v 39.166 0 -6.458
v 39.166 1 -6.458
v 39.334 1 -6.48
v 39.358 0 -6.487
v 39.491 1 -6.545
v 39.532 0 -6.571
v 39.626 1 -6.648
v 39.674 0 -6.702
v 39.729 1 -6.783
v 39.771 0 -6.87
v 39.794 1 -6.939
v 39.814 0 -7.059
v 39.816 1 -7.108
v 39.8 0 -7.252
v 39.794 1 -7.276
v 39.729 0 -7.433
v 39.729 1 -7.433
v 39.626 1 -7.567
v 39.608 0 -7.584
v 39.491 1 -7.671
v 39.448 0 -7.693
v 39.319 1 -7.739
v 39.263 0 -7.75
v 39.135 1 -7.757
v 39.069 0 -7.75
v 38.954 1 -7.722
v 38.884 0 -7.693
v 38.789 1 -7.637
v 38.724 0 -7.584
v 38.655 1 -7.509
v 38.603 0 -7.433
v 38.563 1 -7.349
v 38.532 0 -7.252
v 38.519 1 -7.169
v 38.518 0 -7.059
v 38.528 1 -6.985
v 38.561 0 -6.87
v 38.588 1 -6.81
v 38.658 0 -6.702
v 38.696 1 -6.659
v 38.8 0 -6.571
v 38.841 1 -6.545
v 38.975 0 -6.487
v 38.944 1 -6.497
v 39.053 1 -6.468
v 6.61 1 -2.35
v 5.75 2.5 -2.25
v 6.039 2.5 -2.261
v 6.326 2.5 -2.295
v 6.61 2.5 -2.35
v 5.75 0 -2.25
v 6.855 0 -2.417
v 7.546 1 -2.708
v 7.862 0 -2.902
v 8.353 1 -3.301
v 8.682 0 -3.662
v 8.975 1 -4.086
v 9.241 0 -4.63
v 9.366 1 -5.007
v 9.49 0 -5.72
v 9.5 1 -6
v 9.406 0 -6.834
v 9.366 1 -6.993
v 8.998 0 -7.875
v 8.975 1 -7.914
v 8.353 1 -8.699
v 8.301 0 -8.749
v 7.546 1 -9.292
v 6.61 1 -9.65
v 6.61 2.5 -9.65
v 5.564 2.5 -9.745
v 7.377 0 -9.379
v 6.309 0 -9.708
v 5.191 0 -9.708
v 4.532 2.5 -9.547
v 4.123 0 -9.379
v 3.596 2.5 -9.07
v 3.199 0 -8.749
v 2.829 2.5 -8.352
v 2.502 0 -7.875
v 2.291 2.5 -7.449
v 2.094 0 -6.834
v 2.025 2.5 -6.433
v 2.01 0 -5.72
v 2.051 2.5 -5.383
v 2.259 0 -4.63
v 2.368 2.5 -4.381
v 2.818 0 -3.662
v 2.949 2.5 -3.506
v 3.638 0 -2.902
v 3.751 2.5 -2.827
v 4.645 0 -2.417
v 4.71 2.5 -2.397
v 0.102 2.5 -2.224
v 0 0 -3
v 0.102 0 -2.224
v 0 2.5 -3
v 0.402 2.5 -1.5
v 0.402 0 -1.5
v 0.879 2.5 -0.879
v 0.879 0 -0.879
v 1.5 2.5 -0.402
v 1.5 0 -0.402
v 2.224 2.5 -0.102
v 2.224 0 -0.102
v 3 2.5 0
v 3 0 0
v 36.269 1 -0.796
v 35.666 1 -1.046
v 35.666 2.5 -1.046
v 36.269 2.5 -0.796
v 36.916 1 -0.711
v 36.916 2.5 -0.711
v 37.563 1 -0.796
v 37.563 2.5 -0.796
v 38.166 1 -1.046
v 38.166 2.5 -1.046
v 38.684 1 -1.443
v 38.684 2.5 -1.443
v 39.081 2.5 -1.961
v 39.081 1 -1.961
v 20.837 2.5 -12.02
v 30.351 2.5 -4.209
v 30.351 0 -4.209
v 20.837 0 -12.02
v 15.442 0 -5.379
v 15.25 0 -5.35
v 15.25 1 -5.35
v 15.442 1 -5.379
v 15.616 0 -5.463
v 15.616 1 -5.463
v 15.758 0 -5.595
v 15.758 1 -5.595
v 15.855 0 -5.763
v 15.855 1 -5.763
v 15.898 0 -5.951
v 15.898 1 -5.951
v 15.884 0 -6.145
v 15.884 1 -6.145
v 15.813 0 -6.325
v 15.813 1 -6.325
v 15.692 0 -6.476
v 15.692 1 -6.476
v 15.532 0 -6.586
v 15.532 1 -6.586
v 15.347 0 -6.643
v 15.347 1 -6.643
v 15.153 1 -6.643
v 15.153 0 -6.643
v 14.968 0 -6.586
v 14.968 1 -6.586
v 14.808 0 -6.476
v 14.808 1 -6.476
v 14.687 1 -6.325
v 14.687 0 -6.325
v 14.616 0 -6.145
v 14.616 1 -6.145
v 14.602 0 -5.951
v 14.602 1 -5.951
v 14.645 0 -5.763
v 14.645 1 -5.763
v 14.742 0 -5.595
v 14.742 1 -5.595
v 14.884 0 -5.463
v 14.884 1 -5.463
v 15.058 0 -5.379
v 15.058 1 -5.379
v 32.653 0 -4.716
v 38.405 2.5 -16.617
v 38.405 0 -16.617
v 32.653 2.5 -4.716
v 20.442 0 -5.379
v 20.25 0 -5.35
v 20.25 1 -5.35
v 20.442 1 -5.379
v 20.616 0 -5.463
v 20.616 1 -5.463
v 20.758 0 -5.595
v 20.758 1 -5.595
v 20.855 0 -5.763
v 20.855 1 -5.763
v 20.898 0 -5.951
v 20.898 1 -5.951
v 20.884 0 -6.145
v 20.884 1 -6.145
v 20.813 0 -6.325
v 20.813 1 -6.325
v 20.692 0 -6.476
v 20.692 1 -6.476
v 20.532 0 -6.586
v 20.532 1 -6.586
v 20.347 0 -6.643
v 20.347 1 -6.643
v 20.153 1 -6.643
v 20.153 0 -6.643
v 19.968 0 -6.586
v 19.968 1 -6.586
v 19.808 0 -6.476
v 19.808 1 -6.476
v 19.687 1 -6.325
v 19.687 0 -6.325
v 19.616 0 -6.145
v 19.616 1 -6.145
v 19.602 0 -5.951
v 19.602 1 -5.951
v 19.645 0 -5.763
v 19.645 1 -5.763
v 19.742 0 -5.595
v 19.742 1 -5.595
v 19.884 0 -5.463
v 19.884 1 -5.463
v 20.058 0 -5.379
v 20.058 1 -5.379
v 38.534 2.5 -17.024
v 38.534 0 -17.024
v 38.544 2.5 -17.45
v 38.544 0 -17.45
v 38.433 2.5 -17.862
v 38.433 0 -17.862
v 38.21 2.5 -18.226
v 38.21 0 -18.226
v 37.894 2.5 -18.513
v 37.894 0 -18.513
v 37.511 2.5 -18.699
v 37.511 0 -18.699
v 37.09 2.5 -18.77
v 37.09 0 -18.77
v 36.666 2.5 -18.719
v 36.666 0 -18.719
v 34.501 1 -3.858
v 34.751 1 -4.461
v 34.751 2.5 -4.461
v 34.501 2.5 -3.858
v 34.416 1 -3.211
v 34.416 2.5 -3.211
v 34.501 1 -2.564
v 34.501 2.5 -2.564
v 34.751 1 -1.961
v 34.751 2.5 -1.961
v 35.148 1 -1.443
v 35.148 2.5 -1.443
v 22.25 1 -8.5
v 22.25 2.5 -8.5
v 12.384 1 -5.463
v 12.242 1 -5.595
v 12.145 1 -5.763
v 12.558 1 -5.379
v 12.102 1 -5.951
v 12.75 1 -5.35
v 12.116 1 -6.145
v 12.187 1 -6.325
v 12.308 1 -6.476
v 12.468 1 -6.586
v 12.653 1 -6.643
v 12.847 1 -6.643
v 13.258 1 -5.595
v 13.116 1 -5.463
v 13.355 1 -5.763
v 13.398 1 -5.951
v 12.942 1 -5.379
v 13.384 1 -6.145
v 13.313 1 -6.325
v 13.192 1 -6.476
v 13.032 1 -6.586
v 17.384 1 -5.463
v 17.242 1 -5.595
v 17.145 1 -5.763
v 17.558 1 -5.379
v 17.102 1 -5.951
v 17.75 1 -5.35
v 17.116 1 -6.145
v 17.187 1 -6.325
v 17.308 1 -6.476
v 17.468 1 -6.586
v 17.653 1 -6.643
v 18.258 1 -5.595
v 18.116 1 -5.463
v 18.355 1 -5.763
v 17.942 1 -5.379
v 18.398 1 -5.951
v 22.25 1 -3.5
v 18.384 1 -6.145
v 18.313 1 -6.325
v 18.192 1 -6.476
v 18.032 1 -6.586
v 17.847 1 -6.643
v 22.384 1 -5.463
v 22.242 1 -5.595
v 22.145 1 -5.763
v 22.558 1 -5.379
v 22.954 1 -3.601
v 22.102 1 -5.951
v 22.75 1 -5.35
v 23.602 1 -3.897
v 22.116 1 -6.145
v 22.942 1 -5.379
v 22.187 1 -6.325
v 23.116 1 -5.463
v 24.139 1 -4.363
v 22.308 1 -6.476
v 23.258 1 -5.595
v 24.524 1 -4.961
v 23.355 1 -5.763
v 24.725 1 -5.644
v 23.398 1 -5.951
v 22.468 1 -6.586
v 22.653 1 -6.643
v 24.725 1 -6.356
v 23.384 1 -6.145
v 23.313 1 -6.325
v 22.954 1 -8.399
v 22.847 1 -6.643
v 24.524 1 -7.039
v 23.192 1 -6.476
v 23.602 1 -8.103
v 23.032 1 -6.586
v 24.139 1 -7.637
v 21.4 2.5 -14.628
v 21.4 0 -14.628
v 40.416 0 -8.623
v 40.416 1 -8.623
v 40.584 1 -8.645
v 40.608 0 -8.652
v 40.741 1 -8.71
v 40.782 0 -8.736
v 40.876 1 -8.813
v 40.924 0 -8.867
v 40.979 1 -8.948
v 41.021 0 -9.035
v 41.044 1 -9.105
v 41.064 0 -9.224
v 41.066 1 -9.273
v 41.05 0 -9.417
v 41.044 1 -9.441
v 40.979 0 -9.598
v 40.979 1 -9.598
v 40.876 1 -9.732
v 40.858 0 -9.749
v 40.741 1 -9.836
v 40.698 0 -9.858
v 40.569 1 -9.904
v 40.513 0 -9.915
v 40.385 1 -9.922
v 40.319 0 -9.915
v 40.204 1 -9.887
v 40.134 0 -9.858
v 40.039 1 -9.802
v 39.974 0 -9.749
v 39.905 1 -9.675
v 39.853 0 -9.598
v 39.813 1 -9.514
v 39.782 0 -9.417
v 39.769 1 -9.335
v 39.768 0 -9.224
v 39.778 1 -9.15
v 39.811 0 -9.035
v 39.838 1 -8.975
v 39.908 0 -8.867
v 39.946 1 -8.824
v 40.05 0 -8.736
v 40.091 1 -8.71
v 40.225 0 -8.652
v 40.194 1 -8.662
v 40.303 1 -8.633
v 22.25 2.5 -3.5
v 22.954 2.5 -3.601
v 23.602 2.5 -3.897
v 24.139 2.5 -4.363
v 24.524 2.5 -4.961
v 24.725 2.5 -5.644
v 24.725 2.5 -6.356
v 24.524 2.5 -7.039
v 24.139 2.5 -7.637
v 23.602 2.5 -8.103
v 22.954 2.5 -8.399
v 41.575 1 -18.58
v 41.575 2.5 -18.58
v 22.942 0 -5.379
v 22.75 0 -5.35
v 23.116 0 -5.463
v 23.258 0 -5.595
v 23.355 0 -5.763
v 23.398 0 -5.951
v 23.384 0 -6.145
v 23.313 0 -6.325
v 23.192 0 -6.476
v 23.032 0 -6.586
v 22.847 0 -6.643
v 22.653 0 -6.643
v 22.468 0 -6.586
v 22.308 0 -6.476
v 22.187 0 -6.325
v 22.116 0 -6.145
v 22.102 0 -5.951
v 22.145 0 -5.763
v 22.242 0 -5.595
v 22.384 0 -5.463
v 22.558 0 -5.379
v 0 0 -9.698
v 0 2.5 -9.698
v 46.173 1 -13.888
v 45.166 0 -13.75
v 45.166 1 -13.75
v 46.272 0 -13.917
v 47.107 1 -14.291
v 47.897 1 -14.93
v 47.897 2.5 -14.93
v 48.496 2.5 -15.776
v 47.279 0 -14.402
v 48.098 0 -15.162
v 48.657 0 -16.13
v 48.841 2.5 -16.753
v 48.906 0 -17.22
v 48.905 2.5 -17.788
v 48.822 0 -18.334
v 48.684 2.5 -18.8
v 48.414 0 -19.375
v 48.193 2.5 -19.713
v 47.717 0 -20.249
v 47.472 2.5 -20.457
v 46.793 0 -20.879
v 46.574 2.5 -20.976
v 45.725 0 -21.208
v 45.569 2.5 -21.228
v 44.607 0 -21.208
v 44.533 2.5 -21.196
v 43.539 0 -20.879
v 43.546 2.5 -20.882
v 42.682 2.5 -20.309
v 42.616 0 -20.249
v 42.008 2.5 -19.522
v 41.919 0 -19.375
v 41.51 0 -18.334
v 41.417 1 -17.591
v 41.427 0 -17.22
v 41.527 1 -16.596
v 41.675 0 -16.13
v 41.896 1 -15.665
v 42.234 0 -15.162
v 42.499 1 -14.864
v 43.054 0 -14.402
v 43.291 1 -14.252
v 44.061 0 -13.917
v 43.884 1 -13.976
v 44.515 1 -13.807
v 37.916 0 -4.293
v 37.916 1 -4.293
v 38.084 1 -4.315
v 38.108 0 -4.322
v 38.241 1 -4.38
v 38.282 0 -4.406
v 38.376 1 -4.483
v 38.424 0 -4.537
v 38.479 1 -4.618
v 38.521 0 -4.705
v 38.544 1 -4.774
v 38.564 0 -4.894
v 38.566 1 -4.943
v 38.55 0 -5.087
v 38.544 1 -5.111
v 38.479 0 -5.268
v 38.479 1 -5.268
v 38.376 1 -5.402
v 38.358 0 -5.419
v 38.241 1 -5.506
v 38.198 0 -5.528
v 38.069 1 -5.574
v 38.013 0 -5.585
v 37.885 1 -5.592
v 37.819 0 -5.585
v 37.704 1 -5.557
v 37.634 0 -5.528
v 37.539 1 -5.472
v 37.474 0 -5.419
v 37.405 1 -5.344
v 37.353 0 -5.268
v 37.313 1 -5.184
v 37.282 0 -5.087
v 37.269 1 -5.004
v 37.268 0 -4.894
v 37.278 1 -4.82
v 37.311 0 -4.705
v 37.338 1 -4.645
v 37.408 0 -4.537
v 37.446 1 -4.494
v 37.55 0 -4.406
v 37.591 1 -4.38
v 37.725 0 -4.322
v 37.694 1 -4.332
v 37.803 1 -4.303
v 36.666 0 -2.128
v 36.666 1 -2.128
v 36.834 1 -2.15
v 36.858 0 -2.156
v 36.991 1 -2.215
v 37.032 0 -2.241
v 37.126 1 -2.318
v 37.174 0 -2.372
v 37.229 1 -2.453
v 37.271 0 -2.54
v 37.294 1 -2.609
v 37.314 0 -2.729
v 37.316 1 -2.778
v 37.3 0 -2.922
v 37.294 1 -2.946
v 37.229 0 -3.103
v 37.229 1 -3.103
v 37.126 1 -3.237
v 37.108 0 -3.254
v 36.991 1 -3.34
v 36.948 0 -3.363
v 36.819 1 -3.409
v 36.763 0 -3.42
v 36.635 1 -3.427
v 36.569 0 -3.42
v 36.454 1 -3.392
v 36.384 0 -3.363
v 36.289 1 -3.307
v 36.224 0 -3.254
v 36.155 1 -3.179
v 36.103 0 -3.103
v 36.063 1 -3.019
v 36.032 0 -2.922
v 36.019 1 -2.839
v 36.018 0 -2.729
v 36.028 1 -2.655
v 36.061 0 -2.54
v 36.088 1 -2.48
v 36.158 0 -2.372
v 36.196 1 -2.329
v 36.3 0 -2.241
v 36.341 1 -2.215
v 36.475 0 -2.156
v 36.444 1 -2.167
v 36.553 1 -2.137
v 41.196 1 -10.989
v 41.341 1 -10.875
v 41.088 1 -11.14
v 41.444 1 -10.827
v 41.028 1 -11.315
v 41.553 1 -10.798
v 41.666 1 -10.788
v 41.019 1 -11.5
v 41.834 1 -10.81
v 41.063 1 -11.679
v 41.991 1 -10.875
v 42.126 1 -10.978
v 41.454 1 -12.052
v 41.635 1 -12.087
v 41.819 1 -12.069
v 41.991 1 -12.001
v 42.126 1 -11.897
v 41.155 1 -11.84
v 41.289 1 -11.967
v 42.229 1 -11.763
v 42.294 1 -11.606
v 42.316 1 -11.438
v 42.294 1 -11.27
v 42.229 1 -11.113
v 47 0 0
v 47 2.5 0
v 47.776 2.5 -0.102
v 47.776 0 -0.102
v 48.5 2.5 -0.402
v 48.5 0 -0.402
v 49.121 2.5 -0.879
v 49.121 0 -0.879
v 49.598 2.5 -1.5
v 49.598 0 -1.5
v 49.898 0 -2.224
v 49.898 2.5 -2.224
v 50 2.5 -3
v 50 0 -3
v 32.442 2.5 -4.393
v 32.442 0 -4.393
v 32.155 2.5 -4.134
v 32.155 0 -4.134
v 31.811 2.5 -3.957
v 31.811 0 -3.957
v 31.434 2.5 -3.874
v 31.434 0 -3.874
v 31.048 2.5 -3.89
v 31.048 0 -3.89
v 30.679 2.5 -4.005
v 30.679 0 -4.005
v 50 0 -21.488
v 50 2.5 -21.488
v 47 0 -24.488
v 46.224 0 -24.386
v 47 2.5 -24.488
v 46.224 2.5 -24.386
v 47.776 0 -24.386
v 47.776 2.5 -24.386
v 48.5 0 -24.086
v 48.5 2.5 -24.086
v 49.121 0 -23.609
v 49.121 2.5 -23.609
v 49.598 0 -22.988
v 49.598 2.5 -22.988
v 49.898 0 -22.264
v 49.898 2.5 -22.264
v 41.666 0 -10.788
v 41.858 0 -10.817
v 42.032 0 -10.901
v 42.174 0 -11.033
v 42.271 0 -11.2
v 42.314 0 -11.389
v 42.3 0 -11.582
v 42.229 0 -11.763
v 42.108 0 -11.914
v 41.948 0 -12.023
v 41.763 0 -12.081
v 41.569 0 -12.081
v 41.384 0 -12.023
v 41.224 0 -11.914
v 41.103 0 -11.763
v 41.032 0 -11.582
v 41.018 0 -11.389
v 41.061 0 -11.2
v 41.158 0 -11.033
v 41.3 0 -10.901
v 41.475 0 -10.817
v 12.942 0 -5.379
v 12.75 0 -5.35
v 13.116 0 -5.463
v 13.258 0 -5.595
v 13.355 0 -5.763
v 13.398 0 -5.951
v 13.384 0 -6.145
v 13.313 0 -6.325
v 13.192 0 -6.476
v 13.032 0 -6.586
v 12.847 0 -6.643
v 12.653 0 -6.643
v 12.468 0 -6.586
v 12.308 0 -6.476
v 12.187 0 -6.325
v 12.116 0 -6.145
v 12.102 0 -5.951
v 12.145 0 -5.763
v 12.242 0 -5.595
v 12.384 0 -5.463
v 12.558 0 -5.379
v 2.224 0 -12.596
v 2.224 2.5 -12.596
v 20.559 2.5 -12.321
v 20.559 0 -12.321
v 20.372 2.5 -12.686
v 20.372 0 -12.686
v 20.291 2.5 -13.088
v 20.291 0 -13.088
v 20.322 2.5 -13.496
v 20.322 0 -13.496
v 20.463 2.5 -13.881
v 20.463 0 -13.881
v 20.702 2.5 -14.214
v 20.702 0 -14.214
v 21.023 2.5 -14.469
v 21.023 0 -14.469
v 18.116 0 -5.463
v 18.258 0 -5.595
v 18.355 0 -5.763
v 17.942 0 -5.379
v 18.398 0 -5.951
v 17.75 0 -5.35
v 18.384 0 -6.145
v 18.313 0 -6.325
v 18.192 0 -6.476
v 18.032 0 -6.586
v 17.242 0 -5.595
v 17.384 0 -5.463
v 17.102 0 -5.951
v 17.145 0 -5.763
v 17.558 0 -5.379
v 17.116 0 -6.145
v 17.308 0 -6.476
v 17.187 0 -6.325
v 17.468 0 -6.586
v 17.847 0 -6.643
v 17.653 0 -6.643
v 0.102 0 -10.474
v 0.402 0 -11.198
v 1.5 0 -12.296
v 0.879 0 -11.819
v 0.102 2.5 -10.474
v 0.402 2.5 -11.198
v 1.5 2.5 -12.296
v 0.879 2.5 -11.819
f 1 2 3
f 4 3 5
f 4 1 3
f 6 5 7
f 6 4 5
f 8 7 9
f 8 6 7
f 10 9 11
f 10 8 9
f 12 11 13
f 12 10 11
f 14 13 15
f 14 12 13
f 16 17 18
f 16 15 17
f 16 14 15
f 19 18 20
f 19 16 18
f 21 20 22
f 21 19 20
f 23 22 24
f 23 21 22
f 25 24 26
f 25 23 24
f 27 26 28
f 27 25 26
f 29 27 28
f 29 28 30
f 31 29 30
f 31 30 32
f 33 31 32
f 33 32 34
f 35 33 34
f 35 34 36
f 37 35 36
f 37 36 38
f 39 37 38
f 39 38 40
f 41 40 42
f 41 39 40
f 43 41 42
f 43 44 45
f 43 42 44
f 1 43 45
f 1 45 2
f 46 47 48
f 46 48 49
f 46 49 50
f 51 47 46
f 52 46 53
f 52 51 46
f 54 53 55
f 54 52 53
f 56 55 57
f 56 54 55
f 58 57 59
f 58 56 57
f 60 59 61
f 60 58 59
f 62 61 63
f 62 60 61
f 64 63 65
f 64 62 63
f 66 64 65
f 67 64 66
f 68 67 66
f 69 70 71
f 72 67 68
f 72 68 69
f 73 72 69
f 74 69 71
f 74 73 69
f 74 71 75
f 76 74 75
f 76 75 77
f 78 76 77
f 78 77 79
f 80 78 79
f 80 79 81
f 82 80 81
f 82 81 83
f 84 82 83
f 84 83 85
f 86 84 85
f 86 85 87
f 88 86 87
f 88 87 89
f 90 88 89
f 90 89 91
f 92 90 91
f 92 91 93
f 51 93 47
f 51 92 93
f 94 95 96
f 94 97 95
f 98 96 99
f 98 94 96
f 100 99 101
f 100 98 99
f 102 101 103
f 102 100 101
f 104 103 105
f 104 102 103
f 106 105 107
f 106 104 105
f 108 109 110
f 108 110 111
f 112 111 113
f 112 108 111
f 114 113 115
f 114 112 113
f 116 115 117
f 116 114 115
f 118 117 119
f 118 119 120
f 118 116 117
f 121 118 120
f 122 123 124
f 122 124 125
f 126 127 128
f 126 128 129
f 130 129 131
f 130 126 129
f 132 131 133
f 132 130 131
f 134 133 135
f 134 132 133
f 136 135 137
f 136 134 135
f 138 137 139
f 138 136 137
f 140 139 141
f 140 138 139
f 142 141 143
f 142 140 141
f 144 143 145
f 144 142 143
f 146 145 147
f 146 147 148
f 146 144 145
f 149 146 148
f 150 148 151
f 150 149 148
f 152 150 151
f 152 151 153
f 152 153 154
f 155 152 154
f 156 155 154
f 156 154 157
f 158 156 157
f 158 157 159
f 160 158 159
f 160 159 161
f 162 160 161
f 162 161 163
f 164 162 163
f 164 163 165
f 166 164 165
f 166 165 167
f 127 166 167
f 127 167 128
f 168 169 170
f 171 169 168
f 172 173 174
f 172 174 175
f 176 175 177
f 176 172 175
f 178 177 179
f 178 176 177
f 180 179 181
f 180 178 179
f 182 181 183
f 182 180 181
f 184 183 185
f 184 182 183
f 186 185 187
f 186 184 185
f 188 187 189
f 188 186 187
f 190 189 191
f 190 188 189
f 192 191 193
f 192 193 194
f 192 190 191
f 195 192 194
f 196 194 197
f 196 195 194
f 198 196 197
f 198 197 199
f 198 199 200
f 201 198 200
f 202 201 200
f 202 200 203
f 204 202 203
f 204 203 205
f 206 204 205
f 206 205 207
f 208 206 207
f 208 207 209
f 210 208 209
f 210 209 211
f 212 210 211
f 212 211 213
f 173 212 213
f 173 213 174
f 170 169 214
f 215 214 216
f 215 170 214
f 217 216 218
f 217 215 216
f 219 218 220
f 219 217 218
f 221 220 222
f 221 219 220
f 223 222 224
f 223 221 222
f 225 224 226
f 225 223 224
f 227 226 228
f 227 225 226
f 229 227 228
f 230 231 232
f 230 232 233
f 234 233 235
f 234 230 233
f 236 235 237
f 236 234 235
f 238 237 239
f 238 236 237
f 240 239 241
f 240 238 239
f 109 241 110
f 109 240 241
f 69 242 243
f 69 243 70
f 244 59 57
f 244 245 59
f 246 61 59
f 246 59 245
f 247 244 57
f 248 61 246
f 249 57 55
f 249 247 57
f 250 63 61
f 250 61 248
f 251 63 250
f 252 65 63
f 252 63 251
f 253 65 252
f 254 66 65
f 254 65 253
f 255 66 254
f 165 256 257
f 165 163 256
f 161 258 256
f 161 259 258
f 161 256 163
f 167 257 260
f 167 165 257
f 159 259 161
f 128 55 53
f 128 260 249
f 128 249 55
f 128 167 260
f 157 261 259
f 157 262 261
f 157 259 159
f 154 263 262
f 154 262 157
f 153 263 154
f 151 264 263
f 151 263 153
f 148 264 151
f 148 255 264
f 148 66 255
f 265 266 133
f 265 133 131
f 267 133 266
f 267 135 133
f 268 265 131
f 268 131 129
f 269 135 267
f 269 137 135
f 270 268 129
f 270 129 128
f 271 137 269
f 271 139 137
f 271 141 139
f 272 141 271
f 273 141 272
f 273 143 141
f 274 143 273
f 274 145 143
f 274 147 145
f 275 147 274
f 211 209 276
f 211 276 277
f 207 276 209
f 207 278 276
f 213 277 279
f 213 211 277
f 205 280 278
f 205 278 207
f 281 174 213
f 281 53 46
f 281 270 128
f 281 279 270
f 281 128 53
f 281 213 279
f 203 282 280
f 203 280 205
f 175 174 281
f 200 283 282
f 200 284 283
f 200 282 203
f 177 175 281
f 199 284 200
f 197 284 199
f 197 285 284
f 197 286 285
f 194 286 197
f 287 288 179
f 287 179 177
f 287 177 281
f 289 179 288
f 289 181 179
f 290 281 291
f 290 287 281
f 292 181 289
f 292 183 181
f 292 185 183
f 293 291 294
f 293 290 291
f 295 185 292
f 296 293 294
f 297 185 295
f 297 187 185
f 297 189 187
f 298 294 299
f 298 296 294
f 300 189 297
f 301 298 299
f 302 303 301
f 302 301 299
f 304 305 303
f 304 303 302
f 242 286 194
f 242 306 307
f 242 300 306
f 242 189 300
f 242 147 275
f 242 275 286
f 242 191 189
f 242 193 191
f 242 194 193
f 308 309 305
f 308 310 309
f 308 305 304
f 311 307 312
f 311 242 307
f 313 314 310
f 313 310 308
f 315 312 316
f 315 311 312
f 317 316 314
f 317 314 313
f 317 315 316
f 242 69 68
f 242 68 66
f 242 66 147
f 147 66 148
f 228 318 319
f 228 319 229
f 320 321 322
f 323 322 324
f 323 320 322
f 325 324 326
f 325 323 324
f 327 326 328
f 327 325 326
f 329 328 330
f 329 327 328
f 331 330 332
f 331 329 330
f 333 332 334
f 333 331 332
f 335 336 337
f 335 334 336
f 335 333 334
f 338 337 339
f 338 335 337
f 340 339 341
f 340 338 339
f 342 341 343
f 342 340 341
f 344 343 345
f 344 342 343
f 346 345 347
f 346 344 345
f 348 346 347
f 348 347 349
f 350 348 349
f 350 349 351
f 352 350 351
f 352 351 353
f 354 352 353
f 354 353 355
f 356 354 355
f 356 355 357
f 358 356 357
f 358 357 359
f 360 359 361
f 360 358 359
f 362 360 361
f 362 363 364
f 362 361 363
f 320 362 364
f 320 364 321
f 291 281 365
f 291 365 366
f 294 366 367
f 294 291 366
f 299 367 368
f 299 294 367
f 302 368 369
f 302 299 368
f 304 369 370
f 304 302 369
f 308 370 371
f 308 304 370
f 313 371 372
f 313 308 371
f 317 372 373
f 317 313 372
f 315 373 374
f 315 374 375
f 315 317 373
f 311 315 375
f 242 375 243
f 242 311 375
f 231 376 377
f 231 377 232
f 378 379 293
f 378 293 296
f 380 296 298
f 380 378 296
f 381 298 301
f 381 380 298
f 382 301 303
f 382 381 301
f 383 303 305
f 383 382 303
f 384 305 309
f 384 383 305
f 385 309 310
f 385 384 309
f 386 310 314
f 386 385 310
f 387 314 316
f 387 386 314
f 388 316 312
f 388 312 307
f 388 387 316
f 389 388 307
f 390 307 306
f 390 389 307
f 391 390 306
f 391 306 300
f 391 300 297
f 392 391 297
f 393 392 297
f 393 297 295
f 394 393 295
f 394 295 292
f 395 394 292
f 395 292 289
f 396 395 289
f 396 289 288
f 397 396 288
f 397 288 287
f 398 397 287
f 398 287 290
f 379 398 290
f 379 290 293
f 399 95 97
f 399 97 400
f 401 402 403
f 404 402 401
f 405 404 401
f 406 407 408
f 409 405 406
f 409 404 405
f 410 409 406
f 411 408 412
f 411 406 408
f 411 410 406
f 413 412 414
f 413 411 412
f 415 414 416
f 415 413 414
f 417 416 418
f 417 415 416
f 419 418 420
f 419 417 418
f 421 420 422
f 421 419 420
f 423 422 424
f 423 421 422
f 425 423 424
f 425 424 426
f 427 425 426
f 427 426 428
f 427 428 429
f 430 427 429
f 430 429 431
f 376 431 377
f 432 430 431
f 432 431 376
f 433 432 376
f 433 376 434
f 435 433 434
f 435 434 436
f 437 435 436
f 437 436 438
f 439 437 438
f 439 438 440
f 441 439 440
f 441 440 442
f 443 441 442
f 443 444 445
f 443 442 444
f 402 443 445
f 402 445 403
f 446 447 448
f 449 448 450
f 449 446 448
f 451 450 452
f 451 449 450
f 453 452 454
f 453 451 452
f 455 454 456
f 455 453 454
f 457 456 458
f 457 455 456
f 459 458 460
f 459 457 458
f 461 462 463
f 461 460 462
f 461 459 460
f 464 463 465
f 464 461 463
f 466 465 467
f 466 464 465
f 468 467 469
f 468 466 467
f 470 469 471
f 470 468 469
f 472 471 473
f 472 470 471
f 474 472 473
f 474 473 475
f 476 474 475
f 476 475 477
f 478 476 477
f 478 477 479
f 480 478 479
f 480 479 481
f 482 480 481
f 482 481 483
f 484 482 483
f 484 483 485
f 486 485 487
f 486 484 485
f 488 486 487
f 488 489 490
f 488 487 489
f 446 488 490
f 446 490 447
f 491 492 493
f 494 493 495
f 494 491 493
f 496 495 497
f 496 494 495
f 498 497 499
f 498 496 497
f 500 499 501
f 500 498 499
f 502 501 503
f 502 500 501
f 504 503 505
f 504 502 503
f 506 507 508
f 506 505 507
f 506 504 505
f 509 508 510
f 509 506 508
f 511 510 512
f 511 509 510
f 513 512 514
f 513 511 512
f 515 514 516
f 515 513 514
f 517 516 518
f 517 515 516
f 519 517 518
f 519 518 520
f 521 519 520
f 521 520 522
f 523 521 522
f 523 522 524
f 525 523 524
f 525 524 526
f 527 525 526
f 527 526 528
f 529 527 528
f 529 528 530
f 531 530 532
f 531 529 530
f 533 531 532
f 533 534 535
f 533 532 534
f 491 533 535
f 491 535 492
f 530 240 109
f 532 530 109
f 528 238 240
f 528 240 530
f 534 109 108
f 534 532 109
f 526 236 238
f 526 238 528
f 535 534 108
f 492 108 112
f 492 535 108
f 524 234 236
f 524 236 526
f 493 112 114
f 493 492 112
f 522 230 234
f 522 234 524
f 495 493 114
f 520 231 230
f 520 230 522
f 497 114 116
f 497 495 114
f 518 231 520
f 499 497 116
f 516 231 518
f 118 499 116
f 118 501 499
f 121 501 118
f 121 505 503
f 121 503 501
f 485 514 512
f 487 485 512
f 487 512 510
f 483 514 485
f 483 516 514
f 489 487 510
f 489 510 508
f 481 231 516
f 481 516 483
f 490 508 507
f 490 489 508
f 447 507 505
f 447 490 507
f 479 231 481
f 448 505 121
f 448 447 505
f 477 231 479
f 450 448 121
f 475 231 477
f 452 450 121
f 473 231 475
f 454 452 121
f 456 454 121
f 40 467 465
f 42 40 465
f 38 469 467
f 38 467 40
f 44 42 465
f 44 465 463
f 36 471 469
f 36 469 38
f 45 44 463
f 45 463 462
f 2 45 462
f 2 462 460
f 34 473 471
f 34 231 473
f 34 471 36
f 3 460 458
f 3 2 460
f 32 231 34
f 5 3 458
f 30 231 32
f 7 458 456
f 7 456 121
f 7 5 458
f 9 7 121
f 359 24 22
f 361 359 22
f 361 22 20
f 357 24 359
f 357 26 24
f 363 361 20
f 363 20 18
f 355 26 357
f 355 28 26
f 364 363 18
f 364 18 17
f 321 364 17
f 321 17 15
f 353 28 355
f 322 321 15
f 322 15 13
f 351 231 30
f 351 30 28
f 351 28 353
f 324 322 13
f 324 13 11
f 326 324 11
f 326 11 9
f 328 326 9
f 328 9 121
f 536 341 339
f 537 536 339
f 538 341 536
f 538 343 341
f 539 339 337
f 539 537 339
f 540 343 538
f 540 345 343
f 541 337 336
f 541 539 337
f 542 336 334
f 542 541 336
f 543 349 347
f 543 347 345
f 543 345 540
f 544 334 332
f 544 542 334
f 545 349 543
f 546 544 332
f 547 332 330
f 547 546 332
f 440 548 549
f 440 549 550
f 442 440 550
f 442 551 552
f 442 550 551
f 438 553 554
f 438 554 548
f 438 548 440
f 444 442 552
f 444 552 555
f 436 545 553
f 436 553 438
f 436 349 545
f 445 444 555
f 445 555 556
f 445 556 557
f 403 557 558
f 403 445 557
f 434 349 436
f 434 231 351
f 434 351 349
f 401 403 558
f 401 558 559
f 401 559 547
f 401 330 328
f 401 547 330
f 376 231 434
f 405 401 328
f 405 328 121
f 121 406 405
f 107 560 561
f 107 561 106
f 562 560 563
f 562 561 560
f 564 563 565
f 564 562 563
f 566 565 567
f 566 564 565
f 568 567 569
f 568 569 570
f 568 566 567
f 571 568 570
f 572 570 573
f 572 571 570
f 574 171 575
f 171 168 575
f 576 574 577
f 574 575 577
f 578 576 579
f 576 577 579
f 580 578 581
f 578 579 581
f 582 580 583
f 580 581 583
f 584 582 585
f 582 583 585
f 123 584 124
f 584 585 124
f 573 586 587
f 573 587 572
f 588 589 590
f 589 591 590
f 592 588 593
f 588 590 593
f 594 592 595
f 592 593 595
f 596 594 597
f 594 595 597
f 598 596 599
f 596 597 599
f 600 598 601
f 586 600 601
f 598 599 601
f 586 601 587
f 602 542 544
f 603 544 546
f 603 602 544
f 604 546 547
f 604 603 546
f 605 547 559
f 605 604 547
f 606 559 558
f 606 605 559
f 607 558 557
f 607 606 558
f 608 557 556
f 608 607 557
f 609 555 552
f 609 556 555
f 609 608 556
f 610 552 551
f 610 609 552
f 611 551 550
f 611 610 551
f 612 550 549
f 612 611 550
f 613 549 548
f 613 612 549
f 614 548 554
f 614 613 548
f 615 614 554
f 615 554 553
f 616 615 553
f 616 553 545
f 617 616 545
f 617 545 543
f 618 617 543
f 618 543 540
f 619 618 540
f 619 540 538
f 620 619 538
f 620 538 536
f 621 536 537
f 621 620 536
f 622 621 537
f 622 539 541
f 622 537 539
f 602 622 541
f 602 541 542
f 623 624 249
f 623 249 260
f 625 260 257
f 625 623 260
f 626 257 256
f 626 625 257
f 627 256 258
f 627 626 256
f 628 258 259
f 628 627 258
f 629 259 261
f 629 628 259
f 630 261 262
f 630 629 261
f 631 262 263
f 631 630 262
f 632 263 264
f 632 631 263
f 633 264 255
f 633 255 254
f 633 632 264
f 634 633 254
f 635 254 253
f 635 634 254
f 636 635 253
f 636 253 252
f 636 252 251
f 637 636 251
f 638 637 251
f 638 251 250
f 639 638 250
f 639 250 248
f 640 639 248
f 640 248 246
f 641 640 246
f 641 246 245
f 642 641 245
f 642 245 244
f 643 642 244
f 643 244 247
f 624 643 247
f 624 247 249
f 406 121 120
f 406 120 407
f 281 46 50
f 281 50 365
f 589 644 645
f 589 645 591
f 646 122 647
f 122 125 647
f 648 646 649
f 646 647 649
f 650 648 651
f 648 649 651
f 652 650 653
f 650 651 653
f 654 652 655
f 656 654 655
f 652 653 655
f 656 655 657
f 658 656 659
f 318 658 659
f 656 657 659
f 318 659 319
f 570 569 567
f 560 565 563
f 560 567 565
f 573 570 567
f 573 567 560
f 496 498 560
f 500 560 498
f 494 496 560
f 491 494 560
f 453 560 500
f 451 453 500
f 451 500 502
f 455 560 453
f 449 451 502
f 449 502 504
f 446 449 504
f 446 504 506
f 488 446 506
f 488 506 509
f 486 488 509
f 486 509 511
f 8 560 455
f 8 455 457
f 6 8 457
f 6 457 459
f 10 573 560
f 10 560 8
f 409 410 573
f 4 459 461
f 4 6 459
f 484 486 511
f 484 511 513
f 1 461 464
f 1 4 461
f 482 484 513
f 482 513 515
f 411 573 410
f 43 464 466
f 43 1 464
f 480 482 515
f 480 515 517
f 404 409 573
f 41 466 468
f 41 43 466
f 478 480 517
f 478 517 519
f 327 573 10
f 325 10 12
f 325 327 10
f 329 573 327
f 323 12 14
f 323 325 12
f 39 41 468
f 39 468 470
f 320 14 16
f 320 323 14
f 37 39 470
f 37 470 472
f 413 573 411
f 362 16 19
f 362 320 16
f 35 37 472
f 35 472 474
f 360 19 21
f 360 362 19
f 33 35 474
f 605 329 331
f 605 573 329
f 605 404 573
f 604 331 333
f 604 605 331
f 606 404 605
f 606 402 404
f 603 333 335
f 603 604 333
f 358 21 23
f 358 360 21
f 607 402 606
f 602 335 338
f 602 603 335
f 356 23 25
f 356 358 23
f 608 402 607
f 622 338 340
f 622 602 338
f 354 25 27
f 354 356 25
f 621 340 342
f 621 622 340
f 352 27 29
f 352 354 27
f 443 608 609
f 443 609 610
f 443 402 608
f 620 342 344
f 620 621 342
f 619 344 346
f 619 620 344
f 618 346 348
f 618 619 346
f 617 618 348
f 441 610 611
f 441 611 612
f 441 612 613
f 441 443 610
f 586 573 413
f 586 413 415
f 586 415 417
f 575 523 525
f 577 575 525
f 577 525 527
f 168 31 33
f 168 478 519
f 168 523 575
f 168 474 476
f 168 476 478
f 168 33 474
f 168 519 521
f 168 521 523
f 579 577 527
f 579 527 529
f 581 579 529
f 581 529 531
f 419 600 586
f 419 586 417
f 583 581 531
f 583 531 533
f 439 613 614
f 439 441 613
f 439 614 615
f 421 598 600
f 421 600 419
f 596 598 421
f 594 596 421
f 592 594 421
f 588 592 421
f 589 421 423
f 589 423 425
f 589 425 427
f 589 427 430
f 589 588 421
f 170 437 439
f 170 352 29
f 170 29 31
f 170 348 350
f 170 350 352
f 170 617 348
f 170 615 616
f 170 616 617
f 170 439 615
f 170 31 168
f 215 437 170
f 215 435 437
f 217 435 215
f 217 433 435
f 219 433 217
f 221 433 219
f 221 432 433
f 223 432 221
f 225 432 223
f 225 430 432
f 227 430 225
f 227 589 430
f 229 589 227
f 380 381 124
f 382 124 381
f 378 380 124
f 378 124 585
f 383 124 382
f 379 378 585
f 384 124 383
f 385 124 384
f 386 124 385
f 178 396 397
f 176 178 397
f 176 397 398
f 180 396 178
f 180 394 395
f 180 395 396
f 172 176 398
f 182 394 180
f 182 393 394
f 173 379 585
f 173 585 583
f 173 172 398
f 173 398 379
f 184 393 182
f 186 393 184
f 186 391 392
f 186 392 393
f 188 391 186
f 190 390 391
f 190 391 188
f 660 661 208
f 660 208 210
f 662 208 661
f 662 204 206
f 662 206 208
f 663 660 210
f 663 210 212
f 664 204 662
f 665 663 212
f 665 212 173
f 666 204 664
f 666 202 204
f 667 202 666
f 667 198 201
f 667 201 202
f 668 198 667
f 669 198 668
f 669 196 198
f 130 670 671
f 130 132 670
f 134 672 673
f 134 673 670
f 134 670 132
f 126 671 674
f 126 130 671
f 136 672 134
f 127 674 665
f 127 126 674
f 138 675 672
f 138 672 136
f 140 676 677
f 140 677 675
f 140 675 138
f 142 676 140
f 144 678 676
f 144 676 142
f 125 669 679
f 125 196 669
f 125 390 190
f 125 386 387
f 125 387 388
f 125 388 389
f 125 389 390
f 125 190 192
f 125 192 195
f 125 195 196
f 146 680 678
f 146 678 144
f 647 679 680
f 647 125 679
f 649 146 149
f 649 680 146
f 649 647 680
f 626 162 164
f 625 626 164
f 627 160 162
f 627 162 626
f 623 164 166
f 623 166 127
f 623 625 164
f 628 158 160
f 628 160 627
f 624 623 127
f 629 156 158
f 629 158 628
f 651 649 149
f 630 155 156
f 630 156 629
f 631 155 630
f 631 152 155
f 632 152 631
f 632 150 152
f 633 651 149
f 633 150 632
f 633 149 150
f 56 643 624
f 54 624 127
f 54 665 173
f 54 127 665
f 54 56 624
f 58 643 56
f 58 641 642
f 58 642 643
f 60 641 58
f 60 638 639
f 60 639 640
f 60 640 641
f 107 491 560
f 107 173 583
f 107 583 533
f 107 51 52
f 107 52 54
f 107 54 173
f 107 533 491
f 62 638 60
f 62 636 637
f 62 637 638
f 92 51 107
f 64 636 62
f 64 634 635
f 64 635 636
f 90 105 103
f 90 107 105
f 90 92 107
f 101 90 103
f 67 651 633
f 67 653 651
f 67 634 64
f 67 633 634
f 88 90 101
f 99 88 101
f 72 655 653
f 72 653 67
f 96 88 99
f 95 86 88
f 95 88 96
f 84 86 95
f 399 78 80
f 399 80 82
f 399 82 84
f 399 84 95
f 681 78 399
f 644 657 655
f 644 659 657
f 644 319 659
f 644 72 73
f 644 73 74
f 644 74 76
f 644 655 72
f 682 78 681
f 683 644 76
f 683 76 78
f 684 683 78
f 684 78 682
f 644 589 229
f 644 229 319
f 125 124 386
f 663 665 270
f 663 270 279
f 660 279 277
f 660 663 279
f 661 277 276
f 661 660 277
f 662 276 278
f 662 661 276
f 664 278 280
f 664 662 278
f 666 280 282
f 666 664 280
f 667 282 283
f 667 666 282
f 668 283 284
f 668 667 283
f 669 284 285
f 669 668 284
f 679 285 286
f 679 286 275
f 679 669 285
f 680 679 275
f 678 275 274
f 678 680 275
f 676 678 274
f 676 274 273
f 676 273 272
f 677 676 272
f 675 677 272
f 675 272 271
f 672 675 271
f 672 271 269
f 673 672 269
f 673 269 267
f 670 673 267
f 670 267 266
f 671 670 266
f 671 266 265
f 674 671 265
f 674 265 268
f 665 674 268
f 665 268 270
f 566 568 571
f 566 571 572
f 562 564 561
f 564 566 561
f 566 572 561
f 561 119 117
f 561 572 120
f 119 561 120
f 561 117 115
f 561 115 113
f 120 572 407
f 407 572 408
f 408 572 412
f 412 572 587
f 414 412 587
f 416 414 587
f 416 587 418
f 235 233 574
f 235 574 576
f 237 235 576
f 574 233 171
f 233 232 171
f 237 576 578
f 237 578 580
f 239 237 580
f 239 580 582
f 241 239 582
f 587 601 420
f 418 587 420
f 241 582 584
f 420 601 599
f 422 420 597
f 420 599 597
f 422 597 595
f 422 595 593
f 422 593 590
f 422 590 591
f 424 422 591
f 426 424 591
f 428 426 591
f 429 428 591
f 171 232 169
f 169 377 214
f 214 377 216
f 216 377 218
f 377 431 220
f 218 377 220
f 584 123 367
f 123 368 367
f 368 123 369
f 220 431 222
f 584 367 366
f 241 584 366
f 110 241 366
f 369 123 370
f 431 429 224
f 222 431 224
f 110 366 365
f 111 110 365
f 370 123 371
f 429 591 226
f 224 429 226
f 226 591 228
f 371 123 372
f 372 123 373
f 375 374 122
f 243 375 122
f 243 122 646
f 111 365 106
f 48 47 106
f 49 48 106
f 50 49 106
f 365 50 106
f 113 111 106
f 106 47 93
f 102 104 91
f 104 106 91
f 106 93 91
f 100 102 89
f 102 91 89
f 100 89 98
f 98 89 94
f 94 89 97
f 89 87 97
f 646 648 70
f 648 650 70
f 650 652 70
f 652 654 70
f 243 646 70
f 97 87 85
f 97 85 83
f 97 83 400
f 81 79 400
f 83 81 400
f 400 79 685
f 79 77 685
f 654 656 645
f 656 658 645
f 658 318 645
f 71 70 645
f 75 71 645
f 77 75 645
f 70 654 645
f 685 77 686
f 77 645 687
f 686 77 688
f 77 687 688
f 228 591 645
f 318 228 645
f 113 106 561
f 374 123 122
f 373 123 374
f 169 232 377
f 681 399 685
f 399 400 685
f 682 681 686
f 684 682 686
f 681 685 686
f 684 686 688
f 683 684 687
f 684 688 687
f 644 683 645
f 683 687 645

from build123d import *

# Parameters (mm, degrees)
SKETCH1_R           = 3.75
SKETCH1_R_2         = 0.65
BOSS_EXTRUDE1_DEPTH = 2.5
CUT_EXTRUDE1_START  = -1.5
SKETCH2_R           = 0.65
CUT_EXTRUDE1_DEPTH  = 1.5
FILLET1_R           = 3
CUT_EXTRUDE3_DEPTH  = 56.730615831
FILLET2_R           = 1.5


with BuildPart() as part:
    # Sketch1 → Boss-Extrude1 (new body)
    with BuildSketch(Plane(origin=(0, 0, 0), x_dir=(1, 0, 0), z_dir=(0, 1, 0))):
        Polygon((0, 0), (0, 12), (50, 25.397459622), (50, 0), align=None)
        with Locations(Location((5.75, 6, 0), (0, 0, 270))):
            Circle(SKETCH1_R, mode=Mode.SUBTRACT)
        with Locations(Location((22.75, 6, 0), (0, 0, 270))):
            Circle(SKETCH1_R_2, mode=Mode.SUBTRACT)
        with Locations(Location((45.166201183, 17.5, 0), (0, 0, 270))):
            Circle(SKETCH1_R, mode=Mode.SUBTRACT)
        with Locations(Location((36.666201183, 2.777568136, 0), (0, 0, 270))):
            Circle(SKETCH1_R_2, mode=Mode.SUBTRACT)
        with Locations(Location((37.916201183, 4.942631645, 0), (0, 0, 270))):
            Circle(SKETCH1_R_2, mode=Mode.SUBTRACT)
        with Locations(Location((39.166201183, 7.107695155, 0), (0, 0, 270))):
            Circle(SKETCH1_R_2, mode=Mode.SUBTRACT)
        with Locations(Location((40.416201183, 9.272758664, 0), (0, 0, 270))):
            Circle(SKETCH1_R_2, mode=Mode.SUBTRACT)
        with Locations(Location((41.666201183, 11.437822174, 0), (0, 0, 270))):
            Circle(SKETCH1_R_2, mode=Mode.SUBTRACT)
        with Locations(Location((20.25, 6, 0), (0, 0, 270))):
            Circle(SKETCH1_R_2, mode=Mode.SUBTRACT)
        with Locations(Location((17.75, 6, 0), (0, 0, 270))):
            Circle(SKETCH1_R_2, mode=Mode.SUBTRACT)
        with Locations(Location((15.25, 6, 0), (0, 0, 270))):
            Circle(SKETCH1_R_2, mode=Mode.SUBTRACT)
        with Locations(Location((12.75, 6, 0), (0, 0, 270))):
            Circle(SKETCH1_R_2, mode=Mode.SUBTRACT)
    extrude(amount=BOSS_EXTRUDE1_DEPTH)

    # Sketch2 → Cut-Extrude1 (cut)
    # profile 1 of 3: a face of its own
    with BuildSketch(Plane(origin=(0, 2.5, 0), x_dir=(1, 0, 0), z_dir=(0, 1, 0)).offset(CUT_EXTRUDE1_START)):
        with BuildLine():
            Line((22.25, 8.5), (6.610232527, 9.65))
            ThreePointArc((6.610232527, 9.65), (8.690099656, 8.32772722), (9.5, 6))
            ThreePointArc((9.5, 6), (8.690099656, 3.67227278), (6.610232527, 2.35))
            Line((6.610232527, 2.35), (22.25, 3.5))
            ThreePointArc((22.25, 3.5), (24.75, 6), (22.25, 8.5))
        make_face()
        with Locations(Location((12.75, 6, 0), (0, 0, 270))):
            Circle(SKETCH2_R, mode=Mode.SUBTRACT)
        with Locations(Location((15.25, 6, 0), (0, 0, 270))):
            Circle(SKETCH2_R, mode=Mode.SUBTRACT)
        with Locations(Location((17.75, 6, 0), (0, 0, 270))):
            Circle(SKETCH2_R, mode=Mode.SUBTRACT)
        with Locations(Location((20.25, 6, 0), (0, 0, 270))):
            Circle(SKETCH2_R, mode=Mode.SUBTRACT)
        with Locations(Location((22.75, 6, 0), (0, 0, 270))):
            Circle(SKETCH2_R, mode=Mode.SUBTRACT)
    # profile 2 of 3: a face of its own
    with BuildSketch(Plane(origin=(0, 2.5, 0), x_dir=(1, 0, 0), z_dir=(0, 1, 0)).offset(CUT_EXTRUDE1_START)):
        with BuildLine():
            ThreePointArc((47.897077643, 14.930016779), (45.712022261, 13.789935398), (43.291201183, 14.252404736))
            Line((43.291201183, 14.252404736), (41.991201183, 12.000738686))
            ThreePointArc((41.991201183, 12.000738686), (42.229117695, 11.762822174), (42.316201183, 11.437822174))
            ThreePointArc((42.316201183, 11.437822174), (41.991201183, 10.874905661), (41.341201183, 10.874905661))
            Line((41.341201183, 10.874905661), (40.741201183, 9.835675177))
            ThreePointArc((40.741201183, 9.835675177), (40.979117695, 9.597758664), (41.066201183, 9.272758664))
            ThreePointArc((41.066201183, 9.272758664), (40.741201183, 8.709842152), (40.091201183, 8.709842152))
            Line((40.091201183, 8.709842152), (39.491201183, 7.670611667))
            ThreePointArc((39.491201183, 7.670611667), (39.729117695, 7.432695155), (39.816201183, 7.107695155))
            ThreePointArc((39.816201183, 7.107695155), (39.491201183, 6.544778642), (38.841201183, 6.544778642))
            Line((38.841201183, 6.544778642), (38.241201183, 5.505548158))
            ThreePointArc((38.241201183, 5.505548158), (38.479117695, 5.267631645), (38.566201183, 4.942631645))
            ThreePointArc((38.566201183, 4.942631645), (38.241201183, 4.379715133), (37.591201183, 4.379715133))
            Line((37.591201183, 4.379715133), (36.991201183, 3.340484648))
            ThreePointArc((36.991201183, 3.340484648), (37.229117695, 3.102568136), (37.316201183, 2.777568136))
            ThreePointArc((37.316201183, 2.777568136), (36.991201183, 2.214651623), (36.341201183, 2.214651623))
            Line((36.341201183, 2.214651623), (35.666201183, 1.045517328))
            ThreePointArc((35.666201183, 1.045517328), (37.563248796, 0.795766272), (39.081264692, 1.960580838))
            Line((39.081264692, 1.960580838), (47.897077643, 14.930016779))
        make_face()
    # profile 3 of 3: a face of its own
    with BuildSketch(Plane(origin=(0, 2.5, 0), x_dir=(1, 0, 0), z_dir=(0, 1, 0)).offset(CUT_EXTRUDE1_START)):
        with BuildLine():
            Line((41.991201183, 12.000738686), (43.291201183, 14.252404736))
            ThreePointArc((43.291201183, 14.252404736), (41.680280449, 16.117662618), (41.575092196, 18.580016779))
            Line((41.575092196, 18.580016779), (34.751137673, 4.460580838))
            ThreePointArc((34.751137673, 4.460580838), (34.501386617, 2.563533225), (35.666201183, 1.045517328))
            Line((35.666201183, 1.045517328), (36.341201183, 2.214651623))
            ThreePointArc((36.341201183, 2.214651623), (36.10328467, 3.102568136), (36.991201183, 3.340484648))
            Line((36.991201183, 3.340484648), (37.591201183, 4.379715133))
            ThreePointArc((37.591201183, 4.379715133), (37.35328467, 5.267631645), (38.241201183, 5.505548158))
            Line((38.241201183, 5.505548158), (38.841201183, 6.544778642))
            ThreePointArc((38.841201183, 6.544778642), (38.60328467, 7.432695155), (39.491201183, 7.670611667))
            Line((39.491201183, 7.670611667), (40.091201183, 8.709842152))
            ThreePointArc((40.091201183, 8.709842152), (39.85328467, 9.597758664), (40.741201183, 9.835675177))
            Line((40.741201183, 9.835675177), (41.341201183, 10.874905661))
            ThreePointArc((41.341201183, 10.874905661), (41.10328467, 11.762822174), (41.991201183, 12.000738686))
        make_face()
    extrude(amount=CUT_EXTRUDE1_DEPTH, mode=Mode.SUBTRACT)

    # Fillet1
    fillet1_edges = [part.edges().sort_by_distance(p)[0] for p in [
        (50, 1.25, 0),
        (0, 1.25, 0),
        (0, 1.25, -12),
        (50, 1.25, -25.397459622),
    ]]
    fillet(fillet1_edges, radius=FILLET1_R)

    # Sketch3 → Cut-Extrude3 (cut, through all)
    with BuildSketch(Plane(origin=(0, 2.5, 0), x_dir=(1, 0, 0), z_dir=(0, 1, 0))):
        Polygon((18.580286951, 13.872744342), (39.830655129, 19.566763335), (31.823901882, 3), align=None)
    extrude(amount=-CUT_EXTRUDE3_DEPTH, mode=Mode.SUBTRACT)

    # Fillet2
    fillet2_edges = [part.edges().sort_by_distance(p)[0] for p in [
        (31.823901882, 1.25, -3),
        (18.580286951, 1.25, -13.872744342),
        (39.830655129, 1.25, -19.566763335),
    ]]
    fillet(fillet2_edges, radius=FILLET2_R)


solid = part.part
